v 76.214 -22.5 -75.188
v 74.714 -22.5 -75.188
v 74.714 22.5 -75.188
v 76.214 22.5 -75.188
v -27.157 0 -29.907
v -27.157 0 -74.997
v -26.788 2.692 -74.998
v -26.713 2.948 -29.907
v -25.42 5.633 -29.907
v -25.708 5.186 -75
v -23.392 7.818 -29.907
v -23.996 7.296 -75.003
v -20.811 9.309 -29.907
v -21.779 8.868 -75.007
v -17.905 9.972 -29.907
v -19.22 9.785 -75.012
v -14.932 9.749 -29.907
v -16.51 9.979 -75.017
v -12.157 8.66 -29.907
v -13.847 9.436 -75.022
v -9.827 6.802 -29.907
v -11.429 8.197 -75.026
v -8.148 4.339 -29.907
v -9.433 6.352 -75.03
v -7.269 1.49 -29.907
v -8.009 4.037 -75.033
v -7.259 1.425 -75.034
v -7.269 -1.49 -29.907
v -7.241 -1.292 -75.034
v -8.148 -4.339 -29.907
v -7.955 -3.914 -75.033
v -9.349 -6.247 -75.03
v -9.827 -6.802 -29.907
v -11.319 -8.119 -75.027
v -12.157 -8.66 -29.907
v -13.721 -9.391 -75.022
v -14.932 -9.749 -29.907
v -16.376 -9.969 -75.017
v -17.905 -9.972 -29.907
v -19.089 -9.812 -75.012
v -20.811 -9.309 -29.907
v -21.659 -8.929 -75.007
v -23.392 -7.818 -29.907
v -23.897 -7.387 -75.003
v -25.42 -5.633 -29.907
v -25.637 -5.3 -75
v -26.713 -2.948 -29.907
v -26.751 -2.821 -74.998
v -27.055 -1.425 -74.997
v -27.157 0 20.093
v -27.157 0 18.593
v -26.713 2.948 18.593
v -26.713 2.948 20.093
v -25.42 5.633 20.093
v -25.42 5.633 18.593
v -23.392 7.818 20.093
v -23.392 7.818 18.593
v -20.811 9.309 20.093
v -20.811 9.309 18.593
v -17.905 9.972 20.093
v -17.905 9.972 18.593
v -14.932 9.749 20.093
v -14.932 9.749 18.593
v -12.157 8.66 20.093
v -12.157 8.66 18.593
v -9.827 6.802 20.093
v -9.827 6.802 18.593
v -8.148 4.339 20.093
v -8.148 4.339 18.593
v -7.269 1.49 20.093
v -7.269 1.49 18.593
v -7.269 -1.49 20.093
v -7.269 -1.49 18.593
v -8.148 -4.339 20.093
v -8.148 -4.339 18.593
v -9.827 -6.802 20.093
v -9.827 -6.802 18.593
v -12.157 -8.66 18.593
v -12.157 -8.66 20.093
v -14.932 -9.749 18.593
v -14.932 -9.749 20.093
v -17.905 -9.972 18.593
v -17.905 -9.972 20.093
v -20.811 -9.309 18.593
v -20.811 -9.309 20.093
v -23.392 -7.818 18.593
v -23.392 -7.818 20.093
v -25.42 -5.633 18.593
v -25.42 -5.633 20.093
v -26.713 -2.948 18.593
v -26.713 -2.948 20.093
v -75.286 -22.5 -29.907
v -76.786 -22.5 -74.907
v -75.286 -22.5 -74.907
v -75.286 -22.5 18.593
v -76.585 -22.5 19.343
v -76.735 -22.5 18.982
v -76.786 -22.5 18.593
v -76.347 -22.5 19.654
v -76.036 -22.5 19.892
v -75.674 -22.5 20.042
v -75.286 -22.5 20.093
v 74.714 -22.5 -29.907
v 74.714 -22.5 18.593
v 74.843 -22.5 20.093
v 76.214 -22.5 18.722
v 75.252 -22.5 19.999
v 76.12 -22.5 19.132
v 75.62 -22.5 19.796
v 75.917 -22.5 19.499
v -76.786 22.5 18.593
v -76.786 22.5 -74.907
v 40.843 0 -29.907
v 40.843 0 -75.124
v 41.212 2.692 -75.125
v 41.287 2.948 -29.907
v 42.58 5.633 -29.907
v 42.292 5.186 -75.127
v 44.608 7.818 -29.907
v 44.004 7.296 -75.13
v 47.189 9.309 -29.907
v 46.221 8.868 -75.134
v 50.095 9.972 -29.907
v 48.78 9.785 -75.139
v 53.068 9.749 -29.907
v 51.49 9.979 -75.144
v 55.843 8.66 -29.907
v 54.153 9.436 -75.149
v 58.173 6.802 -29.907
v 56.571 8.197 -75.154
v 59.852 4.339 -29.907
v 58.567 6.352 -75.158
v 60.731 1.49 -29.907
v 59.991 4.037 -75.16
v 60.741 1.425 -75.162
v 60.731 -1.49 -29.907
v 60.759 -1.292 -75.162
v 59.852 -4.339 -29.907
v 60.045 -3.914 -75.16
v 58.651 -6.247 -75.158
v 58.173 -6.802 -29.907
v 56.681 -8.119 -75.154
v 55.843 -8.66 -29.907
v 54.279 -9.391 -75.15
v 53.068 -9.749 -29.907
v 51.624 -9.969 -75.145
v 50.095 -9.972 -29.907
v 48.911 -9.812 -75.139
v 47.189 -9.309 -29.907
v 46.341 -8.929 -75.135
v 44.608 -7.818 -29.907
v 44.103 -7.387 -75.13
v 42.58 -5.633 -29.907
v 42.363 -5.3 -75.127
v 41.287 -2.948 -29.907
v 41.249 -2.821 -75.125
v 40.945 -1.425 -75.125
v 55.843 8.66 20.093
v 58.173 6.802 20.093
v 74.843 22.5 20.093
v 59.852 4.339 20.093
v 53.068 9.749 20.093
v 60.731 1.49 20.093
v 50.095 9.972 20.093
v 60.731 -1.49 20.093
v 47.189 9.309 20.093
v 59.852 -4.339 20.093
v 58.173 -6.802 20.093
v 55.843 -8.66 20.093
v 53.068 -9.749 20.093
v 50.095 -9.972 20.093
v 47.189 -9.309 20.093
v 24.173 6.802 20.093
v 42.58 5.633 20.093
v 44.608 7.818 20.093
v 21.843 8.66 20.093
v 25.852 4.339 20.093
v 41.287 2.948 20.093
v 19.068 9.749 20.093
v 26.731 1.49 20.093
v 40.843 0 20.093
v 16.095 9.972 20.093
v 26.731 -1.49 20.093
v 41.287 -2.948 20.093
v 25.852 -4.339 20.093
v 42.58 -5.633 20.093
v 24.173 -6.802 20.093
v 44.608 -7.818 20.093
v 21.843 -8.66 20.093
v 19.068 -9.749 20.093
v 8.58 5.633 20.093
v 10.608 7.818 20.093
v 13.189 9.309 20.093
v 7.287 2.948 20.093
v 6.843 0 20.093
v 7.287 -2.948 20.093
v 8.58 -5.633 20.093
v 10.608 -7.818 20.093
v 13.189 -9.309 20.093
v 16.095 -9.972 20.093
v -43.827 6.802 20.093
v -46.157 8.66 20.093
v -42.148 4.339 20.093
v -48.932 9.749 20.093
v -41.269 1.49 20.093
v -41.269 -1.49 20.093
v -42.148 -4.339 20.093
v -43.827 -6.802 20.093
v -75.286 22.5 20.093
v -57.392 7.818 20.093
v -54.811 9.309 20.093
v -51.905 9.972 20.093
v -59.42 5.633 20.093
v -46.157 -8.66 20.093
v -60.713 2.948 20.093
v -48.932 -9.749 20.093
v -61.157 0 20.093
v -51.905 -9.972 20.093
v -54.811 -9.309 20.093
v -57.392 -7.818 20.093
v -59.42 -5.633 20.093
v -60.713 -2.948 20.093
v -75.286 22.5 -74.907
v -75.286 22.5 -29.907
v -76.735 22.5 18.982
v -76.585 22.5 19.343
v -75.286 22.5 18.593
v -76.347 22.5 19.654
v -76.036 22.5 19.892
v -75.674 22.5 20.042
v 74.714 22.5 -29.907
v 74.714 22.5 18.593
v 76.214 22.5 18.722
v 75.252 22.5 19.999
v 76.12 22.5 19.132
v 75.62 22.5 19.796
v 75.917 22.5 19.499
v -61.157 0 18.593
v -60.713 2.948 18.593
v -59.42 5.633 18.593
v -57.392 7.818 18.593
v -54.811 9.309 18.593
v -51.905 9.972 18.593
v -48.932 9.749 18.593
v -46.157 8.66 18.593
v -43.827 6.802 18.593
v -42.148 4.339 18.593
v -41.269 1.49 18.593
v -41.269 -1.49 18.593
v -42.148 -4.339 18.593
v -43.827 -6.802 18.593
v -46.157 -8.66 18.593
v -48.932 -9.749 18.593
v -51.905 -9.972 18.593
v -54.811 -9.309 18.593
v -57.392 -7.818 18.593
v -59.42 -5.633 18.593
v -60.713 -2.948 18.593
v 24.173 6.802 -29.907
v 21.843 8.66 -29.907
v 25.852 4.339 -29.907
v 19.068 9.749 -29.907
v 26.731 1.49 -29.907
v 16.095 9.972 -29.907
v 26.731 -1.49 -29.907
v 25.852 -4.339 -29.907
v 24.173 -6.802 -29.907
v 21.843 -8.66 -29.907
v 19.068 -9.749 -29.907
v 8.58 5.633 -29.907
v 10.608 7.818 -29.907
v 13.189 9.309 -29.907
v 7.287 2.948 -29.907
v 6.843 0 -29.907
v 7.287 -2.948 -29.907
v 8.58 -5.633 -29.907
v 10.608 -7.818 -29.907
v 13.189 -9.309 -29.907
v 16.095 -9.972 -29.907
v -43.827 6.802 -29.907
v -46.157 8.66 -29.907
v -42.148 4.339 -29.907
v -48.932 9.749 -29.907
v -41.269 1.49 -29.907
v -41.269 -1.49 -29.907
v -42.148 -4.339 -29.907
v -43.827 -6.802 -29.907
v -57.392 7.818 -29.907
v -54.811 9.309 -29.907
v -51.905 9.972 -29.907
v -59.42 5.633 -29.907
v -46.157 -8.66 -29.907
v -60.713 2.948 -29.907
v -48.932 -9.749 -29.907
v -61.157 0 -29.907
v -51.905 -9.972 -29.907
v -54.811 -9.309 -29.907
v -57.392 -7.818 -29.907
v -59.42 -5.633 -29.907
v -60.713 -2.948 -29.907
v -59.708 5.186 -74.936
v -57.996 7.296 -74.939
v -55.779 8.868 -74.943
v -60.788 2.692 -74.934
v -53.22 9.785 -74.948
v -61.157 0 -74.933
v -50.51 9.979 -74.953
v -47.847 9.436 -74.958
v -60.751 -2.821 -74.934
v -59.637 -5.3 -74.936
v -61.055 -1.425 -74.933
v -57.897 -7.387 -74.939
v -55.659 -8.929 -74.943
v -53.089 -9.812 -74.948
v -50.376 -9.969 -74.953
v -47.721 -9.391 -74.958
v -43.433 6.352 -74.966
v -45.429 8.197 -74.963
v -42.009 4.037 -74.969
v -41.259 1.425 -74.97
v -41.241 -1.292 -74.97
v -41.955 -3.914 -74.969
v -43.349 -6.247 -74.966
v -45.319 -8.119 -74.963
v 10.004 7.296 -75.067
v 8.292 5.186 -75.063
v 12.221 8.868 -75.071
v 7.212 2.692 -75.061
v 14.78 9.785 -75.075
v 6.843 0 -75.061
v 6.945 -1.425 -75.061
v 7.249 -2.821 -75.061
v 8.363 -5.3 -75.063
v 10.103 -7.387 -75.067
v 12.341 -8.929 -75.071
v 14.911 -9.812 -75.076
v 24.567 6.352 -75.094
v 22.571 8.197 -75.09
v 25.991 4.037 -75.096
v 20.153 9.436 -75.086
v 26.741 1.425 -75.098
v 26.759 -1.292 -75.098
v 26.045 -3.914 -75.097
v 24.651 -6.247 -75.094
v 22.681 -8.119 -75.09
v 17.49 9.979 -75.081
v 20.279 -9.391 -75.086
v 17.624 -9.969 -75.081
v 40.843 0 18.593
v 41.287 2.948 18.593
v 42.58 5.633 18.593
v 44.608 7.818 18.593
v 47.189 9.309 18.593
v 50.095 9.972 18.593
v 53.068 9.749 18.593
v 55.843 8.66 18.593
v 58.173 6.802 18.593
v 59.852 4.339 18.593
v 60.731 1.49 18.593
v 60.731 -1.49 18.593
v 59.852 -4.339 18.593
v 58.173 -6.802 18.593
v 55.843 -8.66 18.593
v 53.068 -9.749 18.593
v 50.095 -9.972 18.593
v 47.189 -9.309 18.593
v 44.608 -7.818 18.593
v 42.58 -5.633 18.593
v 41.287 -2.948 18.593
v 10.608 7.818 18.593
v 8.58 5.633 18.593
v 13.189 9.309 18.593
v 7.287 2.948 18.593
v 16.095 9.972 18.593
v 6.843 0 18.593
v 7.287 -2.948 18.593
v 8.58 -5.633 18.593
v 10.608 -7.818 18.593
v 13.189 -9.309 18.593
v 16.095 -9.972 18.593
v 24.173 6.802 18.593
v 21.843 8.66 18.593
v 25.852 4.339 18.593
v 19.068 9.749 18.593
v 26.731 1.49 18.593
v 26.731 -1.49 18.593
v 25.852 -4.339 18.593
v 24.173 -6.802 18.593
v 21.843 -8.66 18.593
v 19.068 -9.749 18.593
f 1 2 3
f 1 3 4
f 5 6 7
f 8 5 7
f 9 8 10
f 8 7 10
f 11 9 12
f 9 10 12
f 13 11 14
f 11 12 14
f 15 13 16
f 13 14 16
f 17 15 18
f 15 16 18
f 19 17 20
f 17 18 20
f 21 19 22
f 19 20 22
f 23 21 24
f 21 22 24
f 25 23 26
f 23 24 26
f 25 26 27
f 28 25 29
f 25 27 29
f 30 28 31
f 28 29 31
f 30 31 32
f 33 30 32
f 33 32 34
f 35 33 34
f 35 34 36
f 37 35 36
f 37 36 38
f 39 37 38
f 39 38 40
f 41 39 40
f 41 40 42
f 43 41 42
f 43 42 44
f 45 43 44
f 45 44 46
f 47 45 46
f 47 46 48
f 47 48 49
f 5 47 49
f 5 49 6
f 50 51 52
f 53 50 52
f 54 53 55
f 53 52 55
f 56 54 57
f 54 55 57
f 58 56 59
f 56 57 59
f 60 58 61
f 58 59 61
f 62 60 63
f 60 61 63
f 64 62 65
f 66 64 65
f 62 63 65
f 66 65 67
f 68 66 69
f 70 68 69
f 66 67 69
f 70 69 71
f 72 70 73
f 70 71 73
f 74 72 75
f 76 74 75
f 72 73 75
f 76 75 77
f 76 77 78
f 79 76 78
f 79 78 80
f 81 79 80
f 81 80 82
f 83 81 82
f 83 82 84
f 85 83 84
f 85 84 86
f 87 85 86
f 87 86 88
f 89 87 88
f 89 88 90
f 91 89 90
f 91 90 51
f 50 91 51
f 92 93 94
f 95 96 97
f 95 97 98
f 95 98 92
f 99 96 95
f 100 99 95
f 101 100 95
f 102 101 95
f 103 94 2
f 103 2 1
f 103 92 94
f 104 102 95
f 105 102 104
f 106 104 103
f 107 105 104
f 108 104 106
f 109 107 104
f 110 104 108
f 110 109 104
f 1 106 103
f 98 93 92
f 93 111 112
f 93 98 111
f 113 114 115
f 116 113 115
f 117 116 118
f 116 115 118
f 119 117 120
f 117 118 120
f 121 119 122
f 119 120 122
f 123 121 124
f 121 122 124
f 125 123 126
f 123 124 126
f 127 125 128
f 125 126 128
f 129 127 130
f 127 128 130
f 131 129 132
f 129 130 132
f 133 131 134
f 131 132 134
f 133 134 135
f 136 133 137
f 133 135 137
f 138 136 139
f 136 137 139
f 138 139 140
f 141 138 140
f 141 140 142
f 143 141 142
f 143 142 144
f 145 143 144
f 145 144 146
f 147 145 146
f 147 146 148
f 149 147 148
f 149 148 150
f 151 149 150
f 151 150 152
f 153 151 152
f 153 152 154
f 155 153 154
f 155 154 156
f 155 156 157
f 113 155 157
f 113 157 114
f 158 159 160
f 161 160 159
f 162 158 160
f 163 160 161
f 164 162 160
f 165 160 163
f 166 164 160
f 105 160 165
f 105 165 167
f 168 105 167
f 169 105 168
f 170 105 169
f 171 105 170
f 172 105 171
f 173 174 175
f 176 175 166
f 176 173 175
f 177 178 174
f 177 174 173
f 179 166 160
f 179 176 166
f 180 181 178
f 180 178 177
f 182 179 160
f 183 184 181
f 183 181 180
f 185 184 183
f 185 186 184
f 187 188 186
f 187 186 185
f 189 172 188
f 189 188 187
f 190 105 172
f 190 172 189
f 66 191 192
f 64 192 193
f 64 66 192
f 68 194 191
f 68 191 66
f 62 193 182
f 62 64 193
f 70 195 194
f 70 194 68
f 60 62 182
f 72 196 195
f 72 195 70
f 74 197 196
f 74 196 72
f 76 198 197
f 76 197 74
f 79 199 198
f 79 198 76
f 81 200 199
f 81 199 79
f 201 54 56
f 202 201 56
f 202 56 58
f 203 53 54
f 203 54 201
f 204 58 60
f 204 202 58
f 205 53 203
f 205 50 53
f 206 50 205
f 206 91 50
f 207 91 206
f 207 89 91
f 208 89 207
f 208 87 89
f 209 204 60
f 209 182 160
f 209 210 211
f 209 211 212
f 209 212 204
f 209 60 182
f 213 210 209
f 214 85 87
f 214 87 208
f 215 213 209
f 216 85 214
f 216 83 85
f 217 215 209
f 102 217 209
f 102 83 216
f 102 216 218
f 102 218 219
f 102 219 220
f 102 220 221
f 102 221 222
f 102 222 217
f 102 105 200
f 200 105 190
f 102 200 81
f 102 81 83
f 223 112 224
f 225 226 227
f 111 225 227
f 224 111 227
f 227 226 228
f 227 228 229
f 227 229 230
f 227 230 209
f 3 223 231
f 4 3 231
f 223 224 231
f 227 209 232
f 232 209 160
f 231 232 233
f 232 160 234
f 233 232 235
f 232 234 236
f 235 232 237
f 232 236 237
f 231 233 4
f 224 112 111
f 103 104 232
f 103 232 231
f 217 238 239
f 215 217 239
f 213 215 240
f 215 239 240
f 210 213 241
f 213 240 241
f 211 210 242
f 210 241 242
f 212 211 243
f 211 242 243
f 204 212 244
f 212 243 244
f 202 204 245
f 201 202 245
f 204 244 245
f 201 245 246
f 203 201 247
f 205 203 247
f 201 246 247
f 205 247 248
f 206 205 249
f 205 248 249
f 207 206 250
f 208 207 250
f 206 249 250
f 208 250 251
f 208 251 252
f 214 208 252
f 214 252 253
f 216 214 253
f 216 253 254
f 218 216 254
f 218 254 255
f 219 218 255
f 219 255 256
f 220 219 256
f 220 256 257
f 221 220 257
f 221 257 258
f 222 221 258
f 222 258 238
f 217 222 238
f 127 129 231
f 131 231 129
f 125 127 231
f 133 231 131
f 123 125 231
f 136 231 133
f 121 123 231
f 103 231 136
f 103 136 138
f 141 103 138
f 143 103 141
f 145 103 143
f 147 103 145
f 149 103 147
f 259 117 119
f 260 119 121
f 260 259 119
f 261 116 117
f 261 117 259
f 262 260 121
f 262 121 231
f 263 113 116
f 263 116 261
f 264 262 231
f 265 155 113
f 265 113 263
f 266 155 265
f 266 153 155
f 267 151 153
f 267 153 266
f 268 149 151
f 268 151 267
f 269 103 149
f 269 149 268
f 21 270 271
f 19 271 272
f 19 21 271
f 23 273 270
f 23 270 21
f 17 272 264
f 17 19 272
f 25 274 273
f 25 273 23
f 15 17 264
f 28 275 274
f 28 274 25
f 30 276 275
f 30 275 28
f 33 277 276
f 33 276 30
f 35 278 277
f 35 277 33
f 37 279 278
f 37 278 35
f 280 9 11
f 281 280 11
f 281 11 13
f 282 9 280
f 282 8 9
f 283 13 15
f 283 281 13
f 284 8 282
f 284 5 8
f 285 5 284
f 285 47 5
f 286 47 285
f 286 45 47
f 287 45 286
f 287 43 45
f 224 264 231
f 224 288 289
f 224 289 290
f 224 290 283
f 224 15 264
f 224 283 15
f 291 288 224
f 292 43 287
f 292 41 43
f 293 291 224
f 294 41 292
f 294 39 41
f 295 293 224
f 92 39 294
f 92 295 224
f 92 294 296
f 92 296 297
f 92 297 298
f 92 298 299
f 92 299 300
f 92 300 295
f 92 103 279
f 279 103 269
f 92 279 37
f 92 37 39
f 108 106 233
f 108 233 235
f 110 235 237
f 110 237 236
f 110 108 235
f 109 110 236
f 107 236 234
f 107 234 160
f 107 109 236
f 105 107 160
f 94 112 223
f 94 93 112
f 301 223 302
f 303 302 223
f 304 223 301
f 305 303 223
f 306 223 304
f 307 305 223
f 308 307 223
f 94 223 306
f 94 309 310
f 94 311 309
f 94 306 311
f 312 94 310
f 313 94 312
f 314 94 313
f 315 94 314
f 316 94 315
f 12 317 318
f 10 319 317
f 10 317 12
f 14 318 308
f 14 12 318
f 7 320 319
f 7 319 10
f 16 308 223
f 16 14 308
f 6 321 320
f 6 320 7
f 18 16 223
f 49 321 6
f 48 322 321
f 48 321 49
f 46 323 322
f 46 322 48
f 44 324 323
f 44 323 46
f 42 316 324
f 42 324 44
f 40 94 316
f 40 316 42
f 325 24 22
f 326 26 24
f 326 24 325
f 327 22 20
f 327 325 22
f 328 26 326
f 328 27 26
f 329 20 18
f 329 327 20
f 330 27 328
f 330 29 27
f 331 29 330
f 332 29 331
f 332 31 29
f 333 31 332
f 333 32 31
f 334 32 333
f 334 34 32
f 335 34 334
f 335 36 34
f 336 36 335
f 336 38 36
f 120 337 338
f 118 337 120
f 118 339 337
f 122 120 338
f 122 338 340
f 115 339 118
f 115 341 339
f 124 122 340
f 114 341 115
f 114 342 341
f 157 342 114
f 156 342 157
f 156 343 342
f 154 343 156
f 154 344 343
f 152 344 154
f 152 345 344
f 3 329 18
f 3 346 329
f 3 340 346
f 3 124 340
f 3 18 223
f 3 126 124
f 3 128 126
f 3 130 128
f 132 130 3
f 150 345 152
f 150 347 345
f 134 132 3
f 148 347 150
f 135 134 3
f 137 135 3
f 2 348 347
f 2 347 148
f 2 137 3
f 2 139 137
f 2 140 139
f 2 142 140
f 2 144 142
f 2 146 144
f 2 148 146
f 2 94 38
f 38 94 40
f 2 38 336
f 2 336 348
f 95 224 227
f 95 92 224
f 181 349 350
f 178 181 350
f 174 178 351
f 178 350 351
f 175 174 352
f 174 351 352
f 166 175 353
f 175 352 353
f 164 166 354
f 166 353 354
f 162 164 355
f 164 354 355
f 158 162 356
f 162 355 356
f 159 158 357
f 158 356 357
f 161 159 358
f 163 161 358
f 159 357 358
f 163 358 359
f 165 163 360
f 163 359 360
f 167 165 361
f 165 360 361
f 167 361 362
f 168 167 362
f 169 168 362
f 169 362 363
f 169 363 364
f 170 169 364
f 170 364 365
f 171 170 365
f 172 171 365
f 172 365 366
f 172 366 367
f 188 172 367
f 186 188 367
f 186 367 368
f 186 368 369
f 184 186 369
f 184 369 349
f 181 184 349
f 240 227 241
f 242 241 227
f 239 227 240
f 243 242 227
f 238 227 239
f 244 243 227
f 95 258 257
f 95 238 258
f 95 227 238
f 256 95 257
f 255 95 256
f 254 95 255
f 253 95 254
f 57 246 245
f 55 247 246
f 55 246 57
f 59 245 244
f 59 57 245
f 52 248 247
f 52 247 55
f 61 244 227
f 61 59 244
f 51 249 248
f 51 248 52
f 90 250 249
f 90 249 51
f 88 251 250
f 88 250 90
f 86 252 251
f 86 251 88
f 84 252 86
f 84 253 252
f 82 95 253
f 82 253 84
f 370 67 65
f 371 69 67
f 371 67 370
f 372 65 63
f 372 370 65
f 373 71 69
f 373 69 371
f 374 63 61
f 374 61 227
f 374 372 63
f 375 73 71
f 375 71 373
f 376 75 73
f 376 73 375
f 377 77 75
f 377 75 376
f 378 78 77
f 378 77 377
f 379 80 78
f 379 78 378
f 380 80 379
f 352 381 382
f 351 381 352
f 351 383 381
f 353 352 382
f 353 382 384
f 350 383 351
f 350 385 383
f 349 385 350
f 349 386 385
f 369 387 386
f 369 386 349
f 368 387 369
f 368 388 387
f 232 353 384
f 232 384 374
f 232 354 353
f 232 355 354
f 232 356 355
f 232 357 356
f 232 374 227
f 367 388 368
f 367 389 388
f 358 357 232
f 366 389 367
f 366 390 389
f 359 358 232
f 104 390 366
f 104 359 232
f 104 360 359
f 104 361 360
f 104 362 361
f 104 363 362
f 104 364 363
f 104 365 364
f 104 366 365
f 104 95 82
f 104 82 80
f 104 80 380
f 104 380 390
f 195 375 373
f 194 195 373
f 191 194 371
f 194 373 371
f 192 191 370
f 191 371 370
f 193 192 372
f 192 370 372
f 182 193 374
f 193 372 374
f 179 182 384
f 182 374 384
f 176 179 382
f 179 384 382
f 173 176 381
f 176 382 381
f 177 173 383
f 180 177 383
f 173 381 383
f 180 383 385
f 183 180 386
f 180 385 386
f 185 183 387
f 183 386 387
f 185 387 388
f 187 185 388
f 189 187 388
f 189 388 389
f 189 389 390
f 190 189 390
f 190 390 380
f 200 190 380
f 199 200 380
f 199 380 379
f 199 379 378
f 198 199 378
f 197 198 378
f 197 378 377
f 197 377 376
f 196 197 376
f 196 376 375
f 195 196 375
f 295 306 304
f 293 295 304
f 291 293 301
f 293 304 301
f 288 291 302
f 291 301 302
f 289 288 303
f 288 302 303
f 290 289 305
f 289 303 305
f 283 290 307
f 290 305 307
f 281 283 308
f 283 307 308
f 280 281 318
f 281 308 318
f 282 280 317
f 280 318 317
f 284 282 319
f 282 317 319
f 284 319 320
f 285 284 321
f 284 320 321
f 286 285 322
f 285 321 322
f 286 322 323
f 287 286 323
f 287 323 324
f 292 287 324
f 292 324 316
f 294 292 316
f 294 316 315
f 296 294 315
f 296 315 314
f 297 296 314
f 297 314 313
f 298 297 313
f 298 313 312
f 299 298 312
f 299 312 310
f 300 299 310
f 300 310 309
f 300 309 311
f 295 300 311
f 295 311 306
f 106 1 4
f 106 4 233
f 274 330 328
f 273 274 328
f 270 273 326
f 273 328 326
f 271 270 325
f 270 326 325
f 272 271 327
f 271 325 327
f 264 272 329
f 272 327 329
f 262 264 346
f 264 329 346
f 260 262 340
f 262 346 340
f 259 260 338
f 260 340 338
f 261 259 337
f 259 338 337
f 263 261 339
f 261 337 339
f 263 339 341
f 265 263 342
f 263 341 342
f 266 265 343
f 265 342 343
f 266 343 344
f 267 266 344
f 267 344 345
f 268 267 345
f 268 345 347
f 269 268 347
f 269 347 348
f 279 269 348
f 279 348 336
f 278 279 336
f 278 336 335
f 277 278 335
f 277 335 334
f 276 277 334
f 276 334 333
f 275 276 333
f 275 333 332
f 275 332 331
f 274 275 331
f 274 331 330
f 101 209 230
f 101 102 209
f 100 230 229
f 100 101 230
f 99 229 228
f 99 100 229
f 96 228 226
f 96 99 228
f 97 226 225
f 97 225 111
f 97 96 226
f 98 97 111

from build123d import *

# Parameters (mm, degrees)
F1_DEPTH = 22.5
F2_DEPTH = 22.5
F3_DEPTH = 22.5
F4_DEPTH = 22.5
F6_D     = 20


with BuildPart() as f1:
    # F0 (on Front) → F1 (new body)
    with BuildSketch(Plane.XZ):
        Polygon((-75.2860918641, -29.9065916457), (-75.2860918641, -74.9065916457), (74.7139081359, -75.1878393225), (74.7139081359, -29.9065916457), align=None)
    extrude(amount=F1_DEPTH)

    # F2 (add): a face of the model
    f2_faces = [f1.faces().sort_by_distance(p)[0] for p in [
        (-0.2082108855, 0, -52.4769765777),
    ]]
    extrude(f2_faces, amount=F2_DEPTH)

    # F0 (on Front) → F3 (join)
    with BuildSketch(Plane.XZ):
        with BuildLine():
            Line((-76.7860918641, -74.9065916457), (-75.2860918641, -74.9065916457))
            Line((-75.2860918641, -74.9065916457), (-75.2860918641, -29.9065916457))
            Line((-75.2860918641, -29.9065916457), (-75.2860918641, 18.5934083543))
            Line((-75.2860918641, 18.5934083543), (74.7139081359, 18.5934083543))
            Line((74.7139081359, 18.5934083543), (74.7139081359, -29.9065916457))
            Line((74.7139081359, -29.9065916457), (74.7139081359, -75.1878393225))
            Line((74.7139081359, -75.1878393225), (76.2139081359, -75.1878393225))
            Line((76.2139081359, -75.1878393225), (76.2139081359, -29.9065916457))
            Line((76.2139081359, -29.9065916457), (76.2139081359, 18.4646829894))
            Line((76.2139081359, 18.4646829894), (76.2139081359, 18.7221337192))
            ThreePointArc((76.2139081359, 18.7221337192), (75.7784667814, 19.6579669998), (74.8426335008, 20.0934083543))
            Line((74.8426335008, 20.0934083543), (74.7139081359, 20.0934083543))
            Line((74.7139081359, 20.0934083543), (74.585182771, 20.0934083543))
            Line((74.585182771, 20.0934083543), (-75.2860918641, 20.0934083543))
            ThreePointArc((-75.2860918641, 20.0934083543), (-76.3467520359, 19.6540685261), (-76.7860918641, 18.5934083543))
            Line((-76.7860918641, 18.5934083543), (-76.7860918641, -29.9065916457))
            Line((-76.7860918641, -29.9065916457), (-76.7860918641, -74.9065916457))
        make_face()
    extrude(amount=F3_DEPTH)

    # F0 (on Front) → F4 (join)
    with BuildSketch(Plane.XZ):
        with BuildLine():
            Line((-76.7860918641, -74.9065916457), (-75.2860918641, -74.9065916457))
            Line((-75.2860918641, -74.9065916457), (-75.2860918641, -29.9065916457))
            Line((-75.2860918641, -29.9065916457), (-75.2860918641, 18.5934083543))
            Line((-75.2860918641, 18.5934083543), (74.7139081359, 18.5934083543))
            Line((74.7139081359, 18.5934083543), (74.7139081359, -29.9065916457))
            Line((74.7139081359, -29.9065916457), (74.7139081359, -75.1878393225))
            Line((74.7139081359, -75.1878393225), (76.2139081359, -75.1878393225))
            Line((76.2139081359, -75.1878393225), (76.2139081359, -29.9065916457))
            Line((76.2139081359, -29.9065916457), (76.2139081359, 18.4646829894))
            Line((76.2139081359, 18.4646829894), (76.2139081359, 18.7221337192))
            ThreePointArc((76.2139081359, 18.7221337192), (75.7784667814, 19.6579669998), (74.8426335008, 20.0934083543))
            Line((74.8426335008, 20.0934083543), (74.7139081359, 20.0934083543))
            Line((74.7139081359, 20.0934083543), (74.585182771, 20.0934083543))
            Line((74.585182771, 20.0934083543), (-75.2860918641, 20.0934083543))
            ThreePointArc((-75.2860918641, 20.0934083543), (-76.3467520359, 19.6540685261), (-76.7860918641, 18.5934083543))
            Line((-76.7860918641, 18.5934083543), (-76.7860918641, -29.9065916457))
            Line((-76.7860918641, -29.9065916457), (-76.7860918641, -74.9065916457))
        make_face()
    extrude(amount=-F4_DEPTH)

    # F6 (through all)
    with Locations(Plane.XY.offset(20.0934083543)):
        with Locations((-51.1573664992, 0), (-17.1573664992, 0), (16.8426335008, 0), (50.8426335008, 0)):
            Hole(F6_D / 2)


solid = f1.part
